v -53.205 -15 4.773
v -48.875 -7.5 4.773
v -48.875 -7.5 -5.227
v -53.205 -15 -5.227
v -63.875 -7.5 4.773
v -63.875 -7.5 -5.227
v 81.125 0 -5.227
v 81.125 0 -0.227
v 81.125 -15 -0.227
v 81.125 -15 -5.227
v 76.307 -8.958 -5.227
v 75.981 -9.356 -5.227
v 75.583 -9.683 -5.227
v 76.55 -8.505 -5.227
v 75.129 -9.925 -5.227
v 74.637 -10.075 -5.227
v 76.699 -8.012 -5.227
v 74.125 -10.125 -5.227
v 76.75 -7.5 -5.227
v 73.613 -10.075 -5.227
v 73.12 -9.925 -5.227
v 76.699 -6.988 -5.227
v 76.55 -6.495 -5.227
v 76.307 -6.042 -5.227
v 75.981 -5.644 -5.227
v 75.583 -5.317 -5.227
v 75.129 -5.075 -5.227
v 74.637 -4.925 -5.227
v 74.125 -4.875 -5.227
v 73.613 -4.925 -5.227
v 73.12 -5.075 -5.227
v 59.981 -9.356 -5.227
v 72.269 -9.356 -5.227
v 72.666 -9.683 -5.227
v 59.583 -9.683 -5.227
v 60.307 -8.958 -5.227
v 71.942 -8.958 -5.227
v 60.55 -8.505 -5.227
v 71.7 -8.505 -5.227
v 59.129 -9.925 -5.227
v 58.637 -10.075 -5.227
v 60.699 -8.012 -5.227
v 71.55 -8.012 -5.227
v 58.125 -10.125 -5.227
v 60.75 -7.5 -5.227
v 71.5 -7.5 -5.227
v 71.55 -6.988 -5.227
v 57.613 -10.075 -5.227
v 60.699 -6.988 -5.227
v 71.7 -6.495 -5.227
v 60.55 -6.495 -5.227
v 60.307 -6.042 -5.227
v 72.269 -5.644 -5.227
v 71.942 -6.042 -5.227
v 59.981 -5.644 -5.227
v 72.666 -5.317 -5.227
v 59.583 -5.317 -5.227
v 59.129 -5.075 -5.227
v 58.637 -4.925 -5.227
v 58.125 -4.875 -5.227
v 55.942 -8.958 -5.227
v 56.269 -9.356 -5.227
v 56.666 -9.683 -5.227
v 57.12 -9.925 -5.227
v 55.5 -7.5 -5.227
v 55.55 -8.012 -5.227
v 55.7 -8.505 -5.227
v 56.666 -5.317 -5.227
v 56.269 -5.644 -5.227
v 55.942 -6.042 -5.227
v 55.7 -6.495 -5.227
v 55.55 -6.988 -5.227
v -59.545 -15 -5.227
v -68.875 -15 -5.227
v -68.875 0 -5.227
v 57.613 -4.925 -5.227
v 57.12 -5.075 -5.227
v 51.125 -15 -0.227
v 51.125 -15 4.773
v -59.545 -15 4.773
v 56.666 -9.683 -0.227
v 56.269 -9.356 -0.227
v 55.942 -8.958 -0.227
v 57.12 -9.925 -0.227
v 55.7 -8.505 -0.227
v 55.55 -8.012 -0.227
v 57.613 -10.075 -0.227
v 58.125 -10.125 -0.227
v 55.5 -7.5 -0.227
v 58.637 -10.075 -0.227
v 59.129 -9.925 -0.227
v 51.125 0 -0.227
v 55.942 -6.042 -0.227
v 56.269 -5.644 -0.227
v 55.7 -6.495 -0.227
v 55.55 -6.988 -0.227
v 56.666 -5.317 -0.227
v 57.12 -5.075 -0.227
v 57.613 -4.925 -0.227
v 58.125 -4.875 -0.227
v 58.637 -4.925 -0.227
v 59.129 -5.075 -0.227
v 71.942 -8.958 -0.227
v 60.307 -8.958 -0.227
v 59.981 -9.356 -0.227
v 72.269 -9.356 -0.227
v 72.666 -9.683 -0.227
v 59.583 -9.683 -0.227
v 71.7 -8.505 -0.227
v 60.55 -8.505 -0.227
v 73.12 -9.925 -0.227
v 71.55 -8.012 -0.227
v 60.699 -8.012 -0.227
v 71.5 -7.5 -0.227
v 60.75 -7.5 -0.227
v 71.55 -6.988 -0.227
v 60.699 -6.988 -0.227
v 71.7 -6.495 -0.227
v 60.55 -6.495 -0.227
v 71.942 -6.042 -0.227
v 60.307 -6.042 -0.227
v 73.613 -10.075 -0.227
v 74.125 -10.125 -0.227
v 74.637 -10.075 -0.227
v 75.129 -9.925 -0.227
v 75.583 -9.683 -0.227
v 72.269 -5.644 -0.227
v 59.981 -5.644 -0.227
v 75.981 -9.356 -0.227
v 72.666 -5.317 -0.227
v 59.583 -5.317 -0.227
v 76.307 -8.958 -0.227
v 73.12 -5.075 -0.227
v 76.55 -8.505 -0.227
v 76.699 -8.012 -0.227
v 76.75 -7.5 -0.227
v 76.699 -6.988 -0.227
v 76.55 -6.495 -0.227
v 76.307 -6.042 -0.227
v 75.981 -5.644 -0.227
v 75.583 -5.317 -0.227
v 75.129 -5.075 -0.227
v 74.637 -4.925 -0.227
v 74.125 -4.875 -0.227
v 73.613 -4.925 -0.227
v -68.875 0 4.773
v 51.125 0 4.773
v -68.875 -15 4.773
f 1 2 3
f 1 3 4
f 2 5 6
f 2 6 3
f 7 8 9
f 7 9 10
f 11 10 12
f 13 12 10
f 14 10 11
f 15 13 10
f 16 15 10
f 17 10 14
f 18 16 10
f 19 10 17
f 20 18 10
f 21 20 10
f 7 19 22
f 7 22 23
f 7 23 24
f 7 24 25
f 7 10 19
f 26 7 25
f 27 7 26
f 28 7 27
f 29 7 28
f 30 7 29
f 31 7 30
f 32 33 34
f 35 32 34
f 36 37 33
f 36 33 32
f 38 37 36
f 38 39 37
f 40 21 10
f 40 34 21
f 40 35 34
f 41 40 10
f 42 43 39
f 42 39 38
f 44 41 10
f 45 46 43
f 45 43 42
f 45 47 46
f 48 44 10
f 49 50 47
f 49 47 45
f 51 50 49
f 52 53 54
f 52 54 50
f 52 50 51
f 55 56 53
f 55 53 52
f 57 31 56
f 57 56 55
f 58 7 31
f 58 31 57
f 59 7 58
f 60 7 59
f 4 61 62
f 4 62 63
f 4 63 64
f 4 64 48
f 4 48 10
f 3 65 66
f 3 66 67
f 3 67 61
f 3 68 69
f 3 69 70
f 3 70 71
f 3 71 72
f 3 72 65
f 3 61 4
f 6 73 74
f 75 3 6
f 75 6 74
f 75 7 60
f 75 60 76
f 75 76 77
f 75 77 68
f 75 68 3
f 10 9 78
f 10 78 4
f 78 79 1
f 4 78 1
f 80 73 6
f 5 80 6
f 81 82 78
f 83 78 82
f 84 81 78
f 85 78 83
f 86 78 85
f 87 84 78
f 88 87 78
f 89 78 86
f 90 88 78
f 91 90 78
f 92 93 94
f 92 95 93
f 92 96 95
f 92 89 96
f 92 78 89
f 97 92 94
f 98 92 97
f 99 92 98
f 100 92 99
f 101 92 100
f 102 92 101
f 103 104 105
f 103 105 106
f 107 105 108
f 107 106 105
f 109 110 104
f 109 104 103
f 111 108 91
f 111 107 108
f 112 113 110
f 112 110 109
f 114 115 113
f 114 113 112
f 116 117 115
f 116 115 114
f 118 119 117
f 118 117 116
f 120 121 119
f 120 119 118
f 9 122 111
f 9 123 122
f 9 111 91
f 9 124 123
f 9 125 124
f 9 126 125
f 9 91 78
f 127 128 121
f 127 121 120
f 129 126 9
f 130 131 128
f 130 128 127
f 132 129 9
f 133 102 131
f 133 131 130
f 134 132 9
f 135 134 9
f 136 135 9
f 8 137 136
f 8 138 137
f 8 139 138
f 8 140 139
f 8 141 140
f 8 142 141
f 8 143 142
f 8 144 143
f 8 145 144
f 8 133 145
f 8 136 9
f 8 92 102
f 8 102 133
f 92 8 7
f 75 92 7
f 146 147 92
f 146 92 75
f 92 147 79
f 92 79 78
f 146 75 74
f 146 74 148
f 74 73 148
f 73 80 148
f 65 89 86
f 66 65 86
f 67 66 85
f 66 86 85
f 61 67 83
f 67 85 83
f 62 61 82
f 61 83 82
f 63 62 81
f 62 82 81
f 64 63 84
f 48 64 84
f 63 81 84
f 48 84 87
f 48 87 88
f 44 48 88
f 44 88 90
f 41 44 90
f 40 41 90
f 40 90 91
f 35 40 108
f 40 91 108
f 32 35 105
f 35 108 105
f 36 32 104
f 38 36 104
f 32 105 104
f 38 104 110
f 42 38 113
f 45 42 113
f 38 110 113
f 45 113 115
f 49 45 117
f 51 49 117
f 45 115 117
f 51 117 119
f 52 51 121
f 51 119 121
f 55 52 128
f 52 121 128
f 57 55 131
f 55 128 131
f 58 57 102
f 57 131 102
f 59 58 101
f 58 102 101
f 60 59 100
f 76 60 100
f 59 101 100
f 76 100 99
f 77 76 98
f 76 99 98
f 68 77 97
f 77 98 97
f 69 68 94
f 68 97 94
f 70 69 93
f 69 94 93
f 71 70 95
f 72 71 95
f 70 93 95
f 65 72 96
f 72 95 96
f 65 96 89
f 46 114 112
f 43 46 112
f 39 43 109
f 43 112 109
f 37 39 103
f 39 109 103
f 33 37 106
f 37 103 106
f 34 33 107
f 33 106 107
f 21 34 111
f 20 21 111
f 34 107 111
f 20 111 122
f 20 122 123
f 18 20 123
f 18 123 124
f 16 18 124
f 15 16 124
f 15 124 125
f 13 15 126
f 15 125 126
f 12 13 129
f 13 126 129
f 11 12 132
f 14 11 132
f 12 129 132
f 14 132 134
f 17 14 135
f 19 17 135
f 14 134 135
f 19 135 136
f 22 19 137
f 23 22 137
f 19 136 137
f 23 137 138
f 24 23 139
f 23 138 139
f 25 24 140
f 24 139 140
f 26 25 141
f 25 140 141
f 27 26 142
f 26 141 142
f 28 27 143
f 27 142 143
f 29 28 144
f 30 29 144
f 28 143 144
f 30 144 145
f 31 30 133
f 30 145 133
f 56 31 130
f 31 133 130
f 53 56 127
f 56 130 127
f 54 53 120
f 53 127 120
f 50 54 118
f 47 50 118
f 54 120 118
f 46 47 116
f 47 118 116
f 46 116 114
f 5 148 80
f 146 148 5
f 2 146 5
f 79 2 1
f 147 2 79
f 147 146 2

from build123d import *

# Parameters (mm, degrees)
PAD_DEPTH       = 15
SKETCH001_R     = 2.625
POCKET_DEPTH    = 5
POCKET001_DEPTH = 10


with BuildPart() as part:
    # Sketch → Pad (new body)
    with BuildSketch(Plane.XZ):
        Polygon((-68.87526, -5.227487), (-68.87526, 4.772513), (51.12474, 4.772513), (51.12474, -0.227487), (81.12474, -0.227487), (81.12474, -5.227487), align=None)
    extrude(amount=PAD_DEPTH)

    # Sketch001 (on Face4 of Pad) → Pocket (cut)
    with BuildSketch(Plane(origin=(0, 0, -0.227487), x_dir=(-1, 0, 0), z_dir=(0, 0, 1))):
        with Locations((-74.12474, 7.5)):
            Circle(SKETCH001_R)
        with Locations((-58.12474, 7.5)):
            Circle(SKETCH001_R)
    extrude(amount=-POCKET_DEPTH, mode=Mode.SUBTRACT)

    # Sketch002 (on Face3 of Pocket) → Pocket001 (cut)
    with BuildSketch(Plane(origin=(0, 0, 4.772513), x_dir=(-1, 0, 0), z_dir=(0, 0, 1))):
        Polygon((56.37526, 20.490381), (63.87526, 7.5), (48.87526, 7.5), align=None)
    extrude(amount=-POCKET001_DEPTH, mode=Mode.SUBTRACT)


solid = part.part
